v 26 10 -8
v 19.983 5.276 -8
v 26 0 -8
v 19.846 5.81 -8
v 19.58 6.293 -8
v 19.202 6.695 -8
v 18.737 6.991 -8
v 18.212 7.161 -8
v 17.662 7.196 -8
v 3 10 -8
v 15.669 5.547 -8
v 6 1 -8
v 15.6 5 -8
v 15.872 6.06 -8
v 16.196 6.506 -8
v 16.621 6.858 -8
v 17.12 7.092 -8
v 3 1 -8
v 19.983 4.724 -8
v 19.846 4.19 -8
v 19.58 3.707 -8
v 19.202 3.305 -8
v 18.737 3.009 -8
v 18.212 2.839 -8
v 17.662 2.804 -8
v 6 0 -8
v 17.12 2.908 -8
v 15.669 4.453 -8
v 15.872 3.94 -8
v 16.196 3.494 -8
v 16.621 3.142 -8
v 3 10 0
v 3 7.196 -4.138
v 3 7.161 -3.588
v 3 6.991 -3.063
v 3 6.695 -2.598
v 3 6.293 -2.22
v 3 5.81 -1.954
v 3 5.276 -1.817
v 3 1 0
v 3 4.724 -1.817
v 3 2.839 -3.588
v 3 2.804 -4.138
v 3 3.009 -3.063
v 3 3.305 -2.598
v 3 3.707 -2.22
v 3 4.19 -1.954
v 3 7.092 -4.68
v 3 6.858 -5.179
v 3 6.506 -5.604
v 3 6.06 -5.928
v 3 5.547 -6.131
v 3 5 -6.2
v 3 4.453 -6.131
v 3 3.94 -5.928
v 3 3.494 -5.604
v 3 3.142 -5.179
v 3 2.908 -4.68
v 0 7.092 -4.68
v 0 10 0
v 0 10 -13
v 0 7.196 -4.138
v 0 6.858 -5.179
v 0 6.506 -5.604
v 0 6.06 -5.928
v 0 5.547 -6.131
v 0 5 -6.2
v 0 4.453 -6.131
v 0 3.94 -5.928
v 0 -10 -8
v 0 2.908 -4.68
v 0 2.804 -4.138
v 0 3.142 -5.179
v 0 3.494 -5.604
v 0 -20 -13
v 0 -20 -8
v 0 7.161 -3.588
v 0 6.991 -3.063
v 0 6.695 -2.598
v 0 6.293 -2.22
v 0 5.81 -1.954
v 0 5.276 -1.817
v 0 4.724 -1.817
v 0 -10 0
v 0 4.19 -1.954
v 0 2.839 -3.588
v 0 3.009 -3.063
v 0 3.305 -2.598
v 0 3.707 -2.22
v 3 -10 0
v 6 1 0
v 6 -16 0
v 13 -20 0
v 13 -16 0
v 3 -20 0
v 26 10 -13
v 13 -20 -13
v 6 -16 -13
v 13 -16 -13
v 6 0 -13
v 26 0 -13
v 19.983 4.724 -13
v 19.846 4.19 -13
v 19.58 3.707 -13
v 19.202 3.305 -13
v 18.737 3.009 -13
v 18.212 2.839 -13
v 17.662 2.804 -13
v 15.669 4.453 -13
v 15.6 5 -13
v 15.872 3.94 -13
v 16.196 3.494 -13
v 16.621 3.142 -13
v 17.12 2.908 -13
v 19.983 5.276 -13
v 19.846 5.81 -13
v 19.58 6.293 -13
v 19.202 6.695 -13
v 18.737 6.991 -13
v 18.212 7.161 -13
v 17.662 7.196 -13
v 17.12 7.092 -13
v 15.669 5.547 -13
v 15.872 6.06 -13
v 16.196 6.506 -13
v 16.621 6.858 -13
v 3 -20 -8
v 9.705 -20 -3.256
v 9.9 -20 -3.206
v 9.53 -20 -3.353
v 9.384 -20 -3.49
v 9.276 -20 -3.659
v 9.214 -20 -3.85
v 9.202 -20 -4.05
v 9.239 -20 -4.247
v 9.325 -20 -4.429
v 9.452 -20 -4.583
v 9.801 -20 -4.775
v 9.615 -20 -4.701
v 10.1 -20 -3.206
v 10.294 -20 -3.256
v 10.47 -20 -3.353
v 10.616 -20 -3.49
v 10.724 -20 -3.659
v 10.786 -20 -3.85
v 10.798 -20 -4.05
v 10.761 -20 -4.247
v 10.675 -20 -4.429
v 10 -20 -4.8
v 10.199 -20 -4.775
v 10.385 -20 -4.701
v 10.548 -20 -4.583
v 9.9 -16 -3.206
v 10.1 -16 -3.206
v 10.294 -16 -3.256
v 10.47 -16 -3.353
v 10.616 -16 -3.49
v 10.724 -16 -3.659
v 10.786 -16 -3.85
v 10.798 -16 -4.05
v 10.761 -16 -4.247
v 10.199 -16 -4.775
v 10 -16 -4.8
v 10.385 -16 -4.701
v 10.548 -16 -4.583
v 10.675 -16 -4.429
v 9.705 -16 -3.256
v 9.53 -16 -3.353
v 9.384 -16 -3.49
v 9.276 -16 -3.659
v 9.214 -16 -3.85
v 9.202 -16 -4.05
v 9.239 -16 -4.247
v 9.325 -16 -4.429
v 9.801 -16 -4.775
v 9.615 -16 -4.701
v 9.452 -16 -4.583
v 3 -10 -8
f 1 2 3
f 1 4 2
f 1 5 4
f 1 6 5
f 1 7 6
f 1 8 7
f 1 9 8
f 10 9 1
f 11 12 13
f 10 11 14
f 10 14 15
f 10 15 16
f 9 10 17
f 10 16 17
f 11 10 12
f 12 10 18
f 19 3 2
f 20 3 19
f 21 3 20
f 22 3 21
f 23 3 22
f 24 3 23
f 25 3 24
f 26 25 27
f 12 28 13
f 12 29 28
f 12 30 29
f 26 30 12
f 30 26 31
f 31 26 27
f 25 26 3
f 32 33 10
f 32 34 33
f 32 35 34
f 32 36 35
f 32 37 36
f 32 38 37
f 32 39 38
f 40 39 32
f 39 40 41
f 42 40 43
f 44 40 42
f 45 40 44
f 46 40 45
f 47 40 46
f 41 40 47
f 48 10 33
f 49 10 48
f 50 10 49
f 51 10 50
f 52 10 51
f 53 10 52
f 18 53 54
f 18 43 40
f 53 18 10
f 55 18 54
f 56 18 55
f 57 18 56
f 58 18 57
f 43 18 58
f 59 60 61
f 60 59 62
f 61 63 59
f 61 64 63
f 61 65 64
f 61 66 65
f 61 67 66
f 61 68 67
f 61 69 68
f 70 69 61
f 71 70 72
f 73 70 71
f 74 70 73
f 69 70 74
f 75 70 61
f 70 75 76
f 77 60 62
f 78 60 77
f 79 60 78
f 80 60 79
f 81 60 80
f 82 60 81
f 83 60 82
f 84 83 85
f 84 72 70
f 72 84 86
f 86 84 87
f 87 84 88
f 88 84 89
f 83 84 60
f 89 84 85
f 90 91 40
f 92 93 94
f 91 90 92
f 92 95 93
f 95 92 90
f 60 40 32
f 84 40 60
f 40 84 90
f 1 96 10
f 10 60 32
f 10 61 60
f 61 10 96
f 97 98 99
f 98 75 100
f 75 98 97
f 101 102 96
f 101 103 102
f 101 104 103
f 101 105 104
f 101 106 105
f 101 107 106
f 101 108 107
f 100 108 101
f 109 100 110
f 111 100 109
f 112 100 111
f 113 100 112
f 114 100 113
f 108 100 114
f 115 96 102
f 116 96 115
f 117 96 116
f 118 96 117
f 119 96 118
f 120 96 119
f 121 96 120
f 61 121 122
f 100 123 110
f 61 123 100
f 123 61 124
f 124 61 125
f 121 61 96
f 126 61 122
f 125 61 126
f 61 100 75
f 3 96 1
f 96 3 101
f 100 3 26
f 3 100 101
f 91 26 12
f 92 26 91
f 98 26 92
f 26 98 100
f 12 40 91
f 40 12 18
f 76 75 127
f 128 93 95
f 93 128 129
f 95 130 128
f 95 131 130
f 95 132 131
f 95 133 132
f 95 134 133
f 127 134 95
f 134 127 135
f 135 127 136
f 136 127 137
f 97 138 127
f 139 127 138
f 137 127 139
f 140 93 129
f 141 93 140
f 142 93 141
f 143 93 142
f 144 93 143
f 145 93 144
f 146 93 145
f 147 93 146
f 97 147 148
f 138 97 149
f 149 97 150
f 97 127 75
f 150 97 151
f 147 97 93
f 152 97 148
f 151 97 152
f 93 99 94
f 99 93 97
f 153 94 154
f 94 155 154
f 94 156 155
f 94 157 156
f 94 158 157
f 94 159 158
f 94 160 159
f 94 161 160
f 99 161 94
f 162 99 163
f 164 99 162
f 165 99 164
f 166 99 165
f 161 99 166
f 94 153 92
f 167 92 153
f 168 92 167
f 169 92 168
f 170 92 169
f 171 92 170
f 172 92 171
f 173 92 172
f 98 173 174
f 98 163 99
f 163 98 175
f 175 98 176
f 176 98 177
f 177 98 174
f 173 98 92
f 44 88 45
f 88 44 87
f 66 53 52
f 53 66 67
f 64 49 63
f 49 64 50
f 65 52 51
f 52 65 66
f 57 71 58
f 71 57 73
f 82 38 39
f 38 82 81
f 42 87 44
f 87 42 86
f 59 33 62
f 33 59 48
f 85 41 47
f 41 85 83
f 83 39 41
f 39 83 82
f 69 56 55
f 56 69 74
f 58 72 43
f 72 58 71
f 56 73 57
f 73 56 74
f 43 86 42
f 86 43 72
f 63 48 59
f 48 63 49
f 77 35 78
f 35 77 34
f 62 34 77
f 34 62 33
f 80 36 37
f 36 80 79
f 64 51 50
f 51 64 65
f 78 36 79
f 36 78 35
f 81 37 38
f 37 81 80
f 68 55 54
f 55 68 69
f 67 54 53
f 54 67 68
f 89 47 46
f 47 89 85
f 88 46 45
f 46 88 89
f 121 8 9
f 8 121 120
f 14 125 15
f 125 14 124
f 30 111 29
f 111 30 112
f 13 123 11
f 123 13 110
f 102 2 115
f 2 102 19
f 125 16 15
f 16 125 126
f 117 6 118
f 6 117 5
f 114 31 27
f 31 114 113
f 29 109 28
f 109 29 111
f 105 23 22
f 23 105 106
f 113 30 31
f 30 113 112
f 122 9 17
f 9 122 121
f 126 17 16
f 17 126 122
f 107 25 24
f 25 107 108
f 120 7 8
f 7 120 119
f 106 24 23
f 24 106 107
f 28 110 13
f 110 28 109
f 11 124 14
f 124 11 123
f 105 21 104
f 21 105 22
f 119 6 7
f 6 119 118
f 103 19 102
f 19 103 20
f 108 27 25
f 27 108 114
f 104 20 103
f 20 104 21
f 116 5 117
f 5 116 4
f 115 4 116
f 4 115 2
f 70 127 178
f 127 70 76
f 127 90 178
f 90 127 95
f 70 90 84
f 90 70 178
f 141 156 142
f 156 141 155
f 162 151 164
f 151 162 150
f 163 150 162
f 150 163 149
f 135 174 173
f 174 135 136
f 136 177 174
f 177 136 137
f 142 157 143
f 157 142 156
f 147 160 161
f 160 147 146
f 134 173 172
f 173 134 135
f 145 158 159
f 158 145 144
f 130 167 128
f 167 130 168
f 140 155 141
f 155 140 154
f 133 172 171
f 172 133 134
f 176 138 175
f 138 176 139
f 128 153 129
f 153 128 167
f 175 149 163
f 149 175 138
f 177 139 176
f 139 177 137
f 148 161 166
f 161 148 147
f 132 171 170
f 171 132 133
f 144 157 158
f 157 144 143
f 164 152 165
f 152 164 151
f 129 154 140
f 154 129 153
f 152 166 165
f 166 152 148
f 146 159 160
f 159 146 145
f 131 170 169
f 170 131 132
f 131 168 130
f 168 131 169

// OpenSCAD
$fn = 25;

r_h = 4.0 / 2 + 0.2;

x_1 = 8.0;
y_1 = 10.0;
z_1 = 3.0;

x_2  =  5.0;
y_2  = y_1;
z_2  = 26.0;
z_2h = 20.0;


rotate([0,90,0])
difference() {
  union() {
    cube([x_1,y_1,z_1]);
    translate([x_1,0,0]) cube([x_2,y_2,z_2]);
    translate([0,-20.0,0]) cube([x_1+x_2,21.0,2*z_1]);
    translate([0,-20.0,z_1]) cube([x_1+x_2,4.0,10.0]);
    
  };
  translate([x_1/2,y_1/2,0]) cylinder( r=r_h, h=z_1 );
  translate([x_1,y_1/2,z_2h-r_h]) rotate([0,90,0]) cylinder( r=r_h, h=x_2 );
  translate([0,-20.0,0]) cube([x_1,10.0,z_1]);
  #translate([x_1/2,-15.0,10.0]) rotate([90,0,0]) cylinder( r=0.8, h=5.0 );
}
